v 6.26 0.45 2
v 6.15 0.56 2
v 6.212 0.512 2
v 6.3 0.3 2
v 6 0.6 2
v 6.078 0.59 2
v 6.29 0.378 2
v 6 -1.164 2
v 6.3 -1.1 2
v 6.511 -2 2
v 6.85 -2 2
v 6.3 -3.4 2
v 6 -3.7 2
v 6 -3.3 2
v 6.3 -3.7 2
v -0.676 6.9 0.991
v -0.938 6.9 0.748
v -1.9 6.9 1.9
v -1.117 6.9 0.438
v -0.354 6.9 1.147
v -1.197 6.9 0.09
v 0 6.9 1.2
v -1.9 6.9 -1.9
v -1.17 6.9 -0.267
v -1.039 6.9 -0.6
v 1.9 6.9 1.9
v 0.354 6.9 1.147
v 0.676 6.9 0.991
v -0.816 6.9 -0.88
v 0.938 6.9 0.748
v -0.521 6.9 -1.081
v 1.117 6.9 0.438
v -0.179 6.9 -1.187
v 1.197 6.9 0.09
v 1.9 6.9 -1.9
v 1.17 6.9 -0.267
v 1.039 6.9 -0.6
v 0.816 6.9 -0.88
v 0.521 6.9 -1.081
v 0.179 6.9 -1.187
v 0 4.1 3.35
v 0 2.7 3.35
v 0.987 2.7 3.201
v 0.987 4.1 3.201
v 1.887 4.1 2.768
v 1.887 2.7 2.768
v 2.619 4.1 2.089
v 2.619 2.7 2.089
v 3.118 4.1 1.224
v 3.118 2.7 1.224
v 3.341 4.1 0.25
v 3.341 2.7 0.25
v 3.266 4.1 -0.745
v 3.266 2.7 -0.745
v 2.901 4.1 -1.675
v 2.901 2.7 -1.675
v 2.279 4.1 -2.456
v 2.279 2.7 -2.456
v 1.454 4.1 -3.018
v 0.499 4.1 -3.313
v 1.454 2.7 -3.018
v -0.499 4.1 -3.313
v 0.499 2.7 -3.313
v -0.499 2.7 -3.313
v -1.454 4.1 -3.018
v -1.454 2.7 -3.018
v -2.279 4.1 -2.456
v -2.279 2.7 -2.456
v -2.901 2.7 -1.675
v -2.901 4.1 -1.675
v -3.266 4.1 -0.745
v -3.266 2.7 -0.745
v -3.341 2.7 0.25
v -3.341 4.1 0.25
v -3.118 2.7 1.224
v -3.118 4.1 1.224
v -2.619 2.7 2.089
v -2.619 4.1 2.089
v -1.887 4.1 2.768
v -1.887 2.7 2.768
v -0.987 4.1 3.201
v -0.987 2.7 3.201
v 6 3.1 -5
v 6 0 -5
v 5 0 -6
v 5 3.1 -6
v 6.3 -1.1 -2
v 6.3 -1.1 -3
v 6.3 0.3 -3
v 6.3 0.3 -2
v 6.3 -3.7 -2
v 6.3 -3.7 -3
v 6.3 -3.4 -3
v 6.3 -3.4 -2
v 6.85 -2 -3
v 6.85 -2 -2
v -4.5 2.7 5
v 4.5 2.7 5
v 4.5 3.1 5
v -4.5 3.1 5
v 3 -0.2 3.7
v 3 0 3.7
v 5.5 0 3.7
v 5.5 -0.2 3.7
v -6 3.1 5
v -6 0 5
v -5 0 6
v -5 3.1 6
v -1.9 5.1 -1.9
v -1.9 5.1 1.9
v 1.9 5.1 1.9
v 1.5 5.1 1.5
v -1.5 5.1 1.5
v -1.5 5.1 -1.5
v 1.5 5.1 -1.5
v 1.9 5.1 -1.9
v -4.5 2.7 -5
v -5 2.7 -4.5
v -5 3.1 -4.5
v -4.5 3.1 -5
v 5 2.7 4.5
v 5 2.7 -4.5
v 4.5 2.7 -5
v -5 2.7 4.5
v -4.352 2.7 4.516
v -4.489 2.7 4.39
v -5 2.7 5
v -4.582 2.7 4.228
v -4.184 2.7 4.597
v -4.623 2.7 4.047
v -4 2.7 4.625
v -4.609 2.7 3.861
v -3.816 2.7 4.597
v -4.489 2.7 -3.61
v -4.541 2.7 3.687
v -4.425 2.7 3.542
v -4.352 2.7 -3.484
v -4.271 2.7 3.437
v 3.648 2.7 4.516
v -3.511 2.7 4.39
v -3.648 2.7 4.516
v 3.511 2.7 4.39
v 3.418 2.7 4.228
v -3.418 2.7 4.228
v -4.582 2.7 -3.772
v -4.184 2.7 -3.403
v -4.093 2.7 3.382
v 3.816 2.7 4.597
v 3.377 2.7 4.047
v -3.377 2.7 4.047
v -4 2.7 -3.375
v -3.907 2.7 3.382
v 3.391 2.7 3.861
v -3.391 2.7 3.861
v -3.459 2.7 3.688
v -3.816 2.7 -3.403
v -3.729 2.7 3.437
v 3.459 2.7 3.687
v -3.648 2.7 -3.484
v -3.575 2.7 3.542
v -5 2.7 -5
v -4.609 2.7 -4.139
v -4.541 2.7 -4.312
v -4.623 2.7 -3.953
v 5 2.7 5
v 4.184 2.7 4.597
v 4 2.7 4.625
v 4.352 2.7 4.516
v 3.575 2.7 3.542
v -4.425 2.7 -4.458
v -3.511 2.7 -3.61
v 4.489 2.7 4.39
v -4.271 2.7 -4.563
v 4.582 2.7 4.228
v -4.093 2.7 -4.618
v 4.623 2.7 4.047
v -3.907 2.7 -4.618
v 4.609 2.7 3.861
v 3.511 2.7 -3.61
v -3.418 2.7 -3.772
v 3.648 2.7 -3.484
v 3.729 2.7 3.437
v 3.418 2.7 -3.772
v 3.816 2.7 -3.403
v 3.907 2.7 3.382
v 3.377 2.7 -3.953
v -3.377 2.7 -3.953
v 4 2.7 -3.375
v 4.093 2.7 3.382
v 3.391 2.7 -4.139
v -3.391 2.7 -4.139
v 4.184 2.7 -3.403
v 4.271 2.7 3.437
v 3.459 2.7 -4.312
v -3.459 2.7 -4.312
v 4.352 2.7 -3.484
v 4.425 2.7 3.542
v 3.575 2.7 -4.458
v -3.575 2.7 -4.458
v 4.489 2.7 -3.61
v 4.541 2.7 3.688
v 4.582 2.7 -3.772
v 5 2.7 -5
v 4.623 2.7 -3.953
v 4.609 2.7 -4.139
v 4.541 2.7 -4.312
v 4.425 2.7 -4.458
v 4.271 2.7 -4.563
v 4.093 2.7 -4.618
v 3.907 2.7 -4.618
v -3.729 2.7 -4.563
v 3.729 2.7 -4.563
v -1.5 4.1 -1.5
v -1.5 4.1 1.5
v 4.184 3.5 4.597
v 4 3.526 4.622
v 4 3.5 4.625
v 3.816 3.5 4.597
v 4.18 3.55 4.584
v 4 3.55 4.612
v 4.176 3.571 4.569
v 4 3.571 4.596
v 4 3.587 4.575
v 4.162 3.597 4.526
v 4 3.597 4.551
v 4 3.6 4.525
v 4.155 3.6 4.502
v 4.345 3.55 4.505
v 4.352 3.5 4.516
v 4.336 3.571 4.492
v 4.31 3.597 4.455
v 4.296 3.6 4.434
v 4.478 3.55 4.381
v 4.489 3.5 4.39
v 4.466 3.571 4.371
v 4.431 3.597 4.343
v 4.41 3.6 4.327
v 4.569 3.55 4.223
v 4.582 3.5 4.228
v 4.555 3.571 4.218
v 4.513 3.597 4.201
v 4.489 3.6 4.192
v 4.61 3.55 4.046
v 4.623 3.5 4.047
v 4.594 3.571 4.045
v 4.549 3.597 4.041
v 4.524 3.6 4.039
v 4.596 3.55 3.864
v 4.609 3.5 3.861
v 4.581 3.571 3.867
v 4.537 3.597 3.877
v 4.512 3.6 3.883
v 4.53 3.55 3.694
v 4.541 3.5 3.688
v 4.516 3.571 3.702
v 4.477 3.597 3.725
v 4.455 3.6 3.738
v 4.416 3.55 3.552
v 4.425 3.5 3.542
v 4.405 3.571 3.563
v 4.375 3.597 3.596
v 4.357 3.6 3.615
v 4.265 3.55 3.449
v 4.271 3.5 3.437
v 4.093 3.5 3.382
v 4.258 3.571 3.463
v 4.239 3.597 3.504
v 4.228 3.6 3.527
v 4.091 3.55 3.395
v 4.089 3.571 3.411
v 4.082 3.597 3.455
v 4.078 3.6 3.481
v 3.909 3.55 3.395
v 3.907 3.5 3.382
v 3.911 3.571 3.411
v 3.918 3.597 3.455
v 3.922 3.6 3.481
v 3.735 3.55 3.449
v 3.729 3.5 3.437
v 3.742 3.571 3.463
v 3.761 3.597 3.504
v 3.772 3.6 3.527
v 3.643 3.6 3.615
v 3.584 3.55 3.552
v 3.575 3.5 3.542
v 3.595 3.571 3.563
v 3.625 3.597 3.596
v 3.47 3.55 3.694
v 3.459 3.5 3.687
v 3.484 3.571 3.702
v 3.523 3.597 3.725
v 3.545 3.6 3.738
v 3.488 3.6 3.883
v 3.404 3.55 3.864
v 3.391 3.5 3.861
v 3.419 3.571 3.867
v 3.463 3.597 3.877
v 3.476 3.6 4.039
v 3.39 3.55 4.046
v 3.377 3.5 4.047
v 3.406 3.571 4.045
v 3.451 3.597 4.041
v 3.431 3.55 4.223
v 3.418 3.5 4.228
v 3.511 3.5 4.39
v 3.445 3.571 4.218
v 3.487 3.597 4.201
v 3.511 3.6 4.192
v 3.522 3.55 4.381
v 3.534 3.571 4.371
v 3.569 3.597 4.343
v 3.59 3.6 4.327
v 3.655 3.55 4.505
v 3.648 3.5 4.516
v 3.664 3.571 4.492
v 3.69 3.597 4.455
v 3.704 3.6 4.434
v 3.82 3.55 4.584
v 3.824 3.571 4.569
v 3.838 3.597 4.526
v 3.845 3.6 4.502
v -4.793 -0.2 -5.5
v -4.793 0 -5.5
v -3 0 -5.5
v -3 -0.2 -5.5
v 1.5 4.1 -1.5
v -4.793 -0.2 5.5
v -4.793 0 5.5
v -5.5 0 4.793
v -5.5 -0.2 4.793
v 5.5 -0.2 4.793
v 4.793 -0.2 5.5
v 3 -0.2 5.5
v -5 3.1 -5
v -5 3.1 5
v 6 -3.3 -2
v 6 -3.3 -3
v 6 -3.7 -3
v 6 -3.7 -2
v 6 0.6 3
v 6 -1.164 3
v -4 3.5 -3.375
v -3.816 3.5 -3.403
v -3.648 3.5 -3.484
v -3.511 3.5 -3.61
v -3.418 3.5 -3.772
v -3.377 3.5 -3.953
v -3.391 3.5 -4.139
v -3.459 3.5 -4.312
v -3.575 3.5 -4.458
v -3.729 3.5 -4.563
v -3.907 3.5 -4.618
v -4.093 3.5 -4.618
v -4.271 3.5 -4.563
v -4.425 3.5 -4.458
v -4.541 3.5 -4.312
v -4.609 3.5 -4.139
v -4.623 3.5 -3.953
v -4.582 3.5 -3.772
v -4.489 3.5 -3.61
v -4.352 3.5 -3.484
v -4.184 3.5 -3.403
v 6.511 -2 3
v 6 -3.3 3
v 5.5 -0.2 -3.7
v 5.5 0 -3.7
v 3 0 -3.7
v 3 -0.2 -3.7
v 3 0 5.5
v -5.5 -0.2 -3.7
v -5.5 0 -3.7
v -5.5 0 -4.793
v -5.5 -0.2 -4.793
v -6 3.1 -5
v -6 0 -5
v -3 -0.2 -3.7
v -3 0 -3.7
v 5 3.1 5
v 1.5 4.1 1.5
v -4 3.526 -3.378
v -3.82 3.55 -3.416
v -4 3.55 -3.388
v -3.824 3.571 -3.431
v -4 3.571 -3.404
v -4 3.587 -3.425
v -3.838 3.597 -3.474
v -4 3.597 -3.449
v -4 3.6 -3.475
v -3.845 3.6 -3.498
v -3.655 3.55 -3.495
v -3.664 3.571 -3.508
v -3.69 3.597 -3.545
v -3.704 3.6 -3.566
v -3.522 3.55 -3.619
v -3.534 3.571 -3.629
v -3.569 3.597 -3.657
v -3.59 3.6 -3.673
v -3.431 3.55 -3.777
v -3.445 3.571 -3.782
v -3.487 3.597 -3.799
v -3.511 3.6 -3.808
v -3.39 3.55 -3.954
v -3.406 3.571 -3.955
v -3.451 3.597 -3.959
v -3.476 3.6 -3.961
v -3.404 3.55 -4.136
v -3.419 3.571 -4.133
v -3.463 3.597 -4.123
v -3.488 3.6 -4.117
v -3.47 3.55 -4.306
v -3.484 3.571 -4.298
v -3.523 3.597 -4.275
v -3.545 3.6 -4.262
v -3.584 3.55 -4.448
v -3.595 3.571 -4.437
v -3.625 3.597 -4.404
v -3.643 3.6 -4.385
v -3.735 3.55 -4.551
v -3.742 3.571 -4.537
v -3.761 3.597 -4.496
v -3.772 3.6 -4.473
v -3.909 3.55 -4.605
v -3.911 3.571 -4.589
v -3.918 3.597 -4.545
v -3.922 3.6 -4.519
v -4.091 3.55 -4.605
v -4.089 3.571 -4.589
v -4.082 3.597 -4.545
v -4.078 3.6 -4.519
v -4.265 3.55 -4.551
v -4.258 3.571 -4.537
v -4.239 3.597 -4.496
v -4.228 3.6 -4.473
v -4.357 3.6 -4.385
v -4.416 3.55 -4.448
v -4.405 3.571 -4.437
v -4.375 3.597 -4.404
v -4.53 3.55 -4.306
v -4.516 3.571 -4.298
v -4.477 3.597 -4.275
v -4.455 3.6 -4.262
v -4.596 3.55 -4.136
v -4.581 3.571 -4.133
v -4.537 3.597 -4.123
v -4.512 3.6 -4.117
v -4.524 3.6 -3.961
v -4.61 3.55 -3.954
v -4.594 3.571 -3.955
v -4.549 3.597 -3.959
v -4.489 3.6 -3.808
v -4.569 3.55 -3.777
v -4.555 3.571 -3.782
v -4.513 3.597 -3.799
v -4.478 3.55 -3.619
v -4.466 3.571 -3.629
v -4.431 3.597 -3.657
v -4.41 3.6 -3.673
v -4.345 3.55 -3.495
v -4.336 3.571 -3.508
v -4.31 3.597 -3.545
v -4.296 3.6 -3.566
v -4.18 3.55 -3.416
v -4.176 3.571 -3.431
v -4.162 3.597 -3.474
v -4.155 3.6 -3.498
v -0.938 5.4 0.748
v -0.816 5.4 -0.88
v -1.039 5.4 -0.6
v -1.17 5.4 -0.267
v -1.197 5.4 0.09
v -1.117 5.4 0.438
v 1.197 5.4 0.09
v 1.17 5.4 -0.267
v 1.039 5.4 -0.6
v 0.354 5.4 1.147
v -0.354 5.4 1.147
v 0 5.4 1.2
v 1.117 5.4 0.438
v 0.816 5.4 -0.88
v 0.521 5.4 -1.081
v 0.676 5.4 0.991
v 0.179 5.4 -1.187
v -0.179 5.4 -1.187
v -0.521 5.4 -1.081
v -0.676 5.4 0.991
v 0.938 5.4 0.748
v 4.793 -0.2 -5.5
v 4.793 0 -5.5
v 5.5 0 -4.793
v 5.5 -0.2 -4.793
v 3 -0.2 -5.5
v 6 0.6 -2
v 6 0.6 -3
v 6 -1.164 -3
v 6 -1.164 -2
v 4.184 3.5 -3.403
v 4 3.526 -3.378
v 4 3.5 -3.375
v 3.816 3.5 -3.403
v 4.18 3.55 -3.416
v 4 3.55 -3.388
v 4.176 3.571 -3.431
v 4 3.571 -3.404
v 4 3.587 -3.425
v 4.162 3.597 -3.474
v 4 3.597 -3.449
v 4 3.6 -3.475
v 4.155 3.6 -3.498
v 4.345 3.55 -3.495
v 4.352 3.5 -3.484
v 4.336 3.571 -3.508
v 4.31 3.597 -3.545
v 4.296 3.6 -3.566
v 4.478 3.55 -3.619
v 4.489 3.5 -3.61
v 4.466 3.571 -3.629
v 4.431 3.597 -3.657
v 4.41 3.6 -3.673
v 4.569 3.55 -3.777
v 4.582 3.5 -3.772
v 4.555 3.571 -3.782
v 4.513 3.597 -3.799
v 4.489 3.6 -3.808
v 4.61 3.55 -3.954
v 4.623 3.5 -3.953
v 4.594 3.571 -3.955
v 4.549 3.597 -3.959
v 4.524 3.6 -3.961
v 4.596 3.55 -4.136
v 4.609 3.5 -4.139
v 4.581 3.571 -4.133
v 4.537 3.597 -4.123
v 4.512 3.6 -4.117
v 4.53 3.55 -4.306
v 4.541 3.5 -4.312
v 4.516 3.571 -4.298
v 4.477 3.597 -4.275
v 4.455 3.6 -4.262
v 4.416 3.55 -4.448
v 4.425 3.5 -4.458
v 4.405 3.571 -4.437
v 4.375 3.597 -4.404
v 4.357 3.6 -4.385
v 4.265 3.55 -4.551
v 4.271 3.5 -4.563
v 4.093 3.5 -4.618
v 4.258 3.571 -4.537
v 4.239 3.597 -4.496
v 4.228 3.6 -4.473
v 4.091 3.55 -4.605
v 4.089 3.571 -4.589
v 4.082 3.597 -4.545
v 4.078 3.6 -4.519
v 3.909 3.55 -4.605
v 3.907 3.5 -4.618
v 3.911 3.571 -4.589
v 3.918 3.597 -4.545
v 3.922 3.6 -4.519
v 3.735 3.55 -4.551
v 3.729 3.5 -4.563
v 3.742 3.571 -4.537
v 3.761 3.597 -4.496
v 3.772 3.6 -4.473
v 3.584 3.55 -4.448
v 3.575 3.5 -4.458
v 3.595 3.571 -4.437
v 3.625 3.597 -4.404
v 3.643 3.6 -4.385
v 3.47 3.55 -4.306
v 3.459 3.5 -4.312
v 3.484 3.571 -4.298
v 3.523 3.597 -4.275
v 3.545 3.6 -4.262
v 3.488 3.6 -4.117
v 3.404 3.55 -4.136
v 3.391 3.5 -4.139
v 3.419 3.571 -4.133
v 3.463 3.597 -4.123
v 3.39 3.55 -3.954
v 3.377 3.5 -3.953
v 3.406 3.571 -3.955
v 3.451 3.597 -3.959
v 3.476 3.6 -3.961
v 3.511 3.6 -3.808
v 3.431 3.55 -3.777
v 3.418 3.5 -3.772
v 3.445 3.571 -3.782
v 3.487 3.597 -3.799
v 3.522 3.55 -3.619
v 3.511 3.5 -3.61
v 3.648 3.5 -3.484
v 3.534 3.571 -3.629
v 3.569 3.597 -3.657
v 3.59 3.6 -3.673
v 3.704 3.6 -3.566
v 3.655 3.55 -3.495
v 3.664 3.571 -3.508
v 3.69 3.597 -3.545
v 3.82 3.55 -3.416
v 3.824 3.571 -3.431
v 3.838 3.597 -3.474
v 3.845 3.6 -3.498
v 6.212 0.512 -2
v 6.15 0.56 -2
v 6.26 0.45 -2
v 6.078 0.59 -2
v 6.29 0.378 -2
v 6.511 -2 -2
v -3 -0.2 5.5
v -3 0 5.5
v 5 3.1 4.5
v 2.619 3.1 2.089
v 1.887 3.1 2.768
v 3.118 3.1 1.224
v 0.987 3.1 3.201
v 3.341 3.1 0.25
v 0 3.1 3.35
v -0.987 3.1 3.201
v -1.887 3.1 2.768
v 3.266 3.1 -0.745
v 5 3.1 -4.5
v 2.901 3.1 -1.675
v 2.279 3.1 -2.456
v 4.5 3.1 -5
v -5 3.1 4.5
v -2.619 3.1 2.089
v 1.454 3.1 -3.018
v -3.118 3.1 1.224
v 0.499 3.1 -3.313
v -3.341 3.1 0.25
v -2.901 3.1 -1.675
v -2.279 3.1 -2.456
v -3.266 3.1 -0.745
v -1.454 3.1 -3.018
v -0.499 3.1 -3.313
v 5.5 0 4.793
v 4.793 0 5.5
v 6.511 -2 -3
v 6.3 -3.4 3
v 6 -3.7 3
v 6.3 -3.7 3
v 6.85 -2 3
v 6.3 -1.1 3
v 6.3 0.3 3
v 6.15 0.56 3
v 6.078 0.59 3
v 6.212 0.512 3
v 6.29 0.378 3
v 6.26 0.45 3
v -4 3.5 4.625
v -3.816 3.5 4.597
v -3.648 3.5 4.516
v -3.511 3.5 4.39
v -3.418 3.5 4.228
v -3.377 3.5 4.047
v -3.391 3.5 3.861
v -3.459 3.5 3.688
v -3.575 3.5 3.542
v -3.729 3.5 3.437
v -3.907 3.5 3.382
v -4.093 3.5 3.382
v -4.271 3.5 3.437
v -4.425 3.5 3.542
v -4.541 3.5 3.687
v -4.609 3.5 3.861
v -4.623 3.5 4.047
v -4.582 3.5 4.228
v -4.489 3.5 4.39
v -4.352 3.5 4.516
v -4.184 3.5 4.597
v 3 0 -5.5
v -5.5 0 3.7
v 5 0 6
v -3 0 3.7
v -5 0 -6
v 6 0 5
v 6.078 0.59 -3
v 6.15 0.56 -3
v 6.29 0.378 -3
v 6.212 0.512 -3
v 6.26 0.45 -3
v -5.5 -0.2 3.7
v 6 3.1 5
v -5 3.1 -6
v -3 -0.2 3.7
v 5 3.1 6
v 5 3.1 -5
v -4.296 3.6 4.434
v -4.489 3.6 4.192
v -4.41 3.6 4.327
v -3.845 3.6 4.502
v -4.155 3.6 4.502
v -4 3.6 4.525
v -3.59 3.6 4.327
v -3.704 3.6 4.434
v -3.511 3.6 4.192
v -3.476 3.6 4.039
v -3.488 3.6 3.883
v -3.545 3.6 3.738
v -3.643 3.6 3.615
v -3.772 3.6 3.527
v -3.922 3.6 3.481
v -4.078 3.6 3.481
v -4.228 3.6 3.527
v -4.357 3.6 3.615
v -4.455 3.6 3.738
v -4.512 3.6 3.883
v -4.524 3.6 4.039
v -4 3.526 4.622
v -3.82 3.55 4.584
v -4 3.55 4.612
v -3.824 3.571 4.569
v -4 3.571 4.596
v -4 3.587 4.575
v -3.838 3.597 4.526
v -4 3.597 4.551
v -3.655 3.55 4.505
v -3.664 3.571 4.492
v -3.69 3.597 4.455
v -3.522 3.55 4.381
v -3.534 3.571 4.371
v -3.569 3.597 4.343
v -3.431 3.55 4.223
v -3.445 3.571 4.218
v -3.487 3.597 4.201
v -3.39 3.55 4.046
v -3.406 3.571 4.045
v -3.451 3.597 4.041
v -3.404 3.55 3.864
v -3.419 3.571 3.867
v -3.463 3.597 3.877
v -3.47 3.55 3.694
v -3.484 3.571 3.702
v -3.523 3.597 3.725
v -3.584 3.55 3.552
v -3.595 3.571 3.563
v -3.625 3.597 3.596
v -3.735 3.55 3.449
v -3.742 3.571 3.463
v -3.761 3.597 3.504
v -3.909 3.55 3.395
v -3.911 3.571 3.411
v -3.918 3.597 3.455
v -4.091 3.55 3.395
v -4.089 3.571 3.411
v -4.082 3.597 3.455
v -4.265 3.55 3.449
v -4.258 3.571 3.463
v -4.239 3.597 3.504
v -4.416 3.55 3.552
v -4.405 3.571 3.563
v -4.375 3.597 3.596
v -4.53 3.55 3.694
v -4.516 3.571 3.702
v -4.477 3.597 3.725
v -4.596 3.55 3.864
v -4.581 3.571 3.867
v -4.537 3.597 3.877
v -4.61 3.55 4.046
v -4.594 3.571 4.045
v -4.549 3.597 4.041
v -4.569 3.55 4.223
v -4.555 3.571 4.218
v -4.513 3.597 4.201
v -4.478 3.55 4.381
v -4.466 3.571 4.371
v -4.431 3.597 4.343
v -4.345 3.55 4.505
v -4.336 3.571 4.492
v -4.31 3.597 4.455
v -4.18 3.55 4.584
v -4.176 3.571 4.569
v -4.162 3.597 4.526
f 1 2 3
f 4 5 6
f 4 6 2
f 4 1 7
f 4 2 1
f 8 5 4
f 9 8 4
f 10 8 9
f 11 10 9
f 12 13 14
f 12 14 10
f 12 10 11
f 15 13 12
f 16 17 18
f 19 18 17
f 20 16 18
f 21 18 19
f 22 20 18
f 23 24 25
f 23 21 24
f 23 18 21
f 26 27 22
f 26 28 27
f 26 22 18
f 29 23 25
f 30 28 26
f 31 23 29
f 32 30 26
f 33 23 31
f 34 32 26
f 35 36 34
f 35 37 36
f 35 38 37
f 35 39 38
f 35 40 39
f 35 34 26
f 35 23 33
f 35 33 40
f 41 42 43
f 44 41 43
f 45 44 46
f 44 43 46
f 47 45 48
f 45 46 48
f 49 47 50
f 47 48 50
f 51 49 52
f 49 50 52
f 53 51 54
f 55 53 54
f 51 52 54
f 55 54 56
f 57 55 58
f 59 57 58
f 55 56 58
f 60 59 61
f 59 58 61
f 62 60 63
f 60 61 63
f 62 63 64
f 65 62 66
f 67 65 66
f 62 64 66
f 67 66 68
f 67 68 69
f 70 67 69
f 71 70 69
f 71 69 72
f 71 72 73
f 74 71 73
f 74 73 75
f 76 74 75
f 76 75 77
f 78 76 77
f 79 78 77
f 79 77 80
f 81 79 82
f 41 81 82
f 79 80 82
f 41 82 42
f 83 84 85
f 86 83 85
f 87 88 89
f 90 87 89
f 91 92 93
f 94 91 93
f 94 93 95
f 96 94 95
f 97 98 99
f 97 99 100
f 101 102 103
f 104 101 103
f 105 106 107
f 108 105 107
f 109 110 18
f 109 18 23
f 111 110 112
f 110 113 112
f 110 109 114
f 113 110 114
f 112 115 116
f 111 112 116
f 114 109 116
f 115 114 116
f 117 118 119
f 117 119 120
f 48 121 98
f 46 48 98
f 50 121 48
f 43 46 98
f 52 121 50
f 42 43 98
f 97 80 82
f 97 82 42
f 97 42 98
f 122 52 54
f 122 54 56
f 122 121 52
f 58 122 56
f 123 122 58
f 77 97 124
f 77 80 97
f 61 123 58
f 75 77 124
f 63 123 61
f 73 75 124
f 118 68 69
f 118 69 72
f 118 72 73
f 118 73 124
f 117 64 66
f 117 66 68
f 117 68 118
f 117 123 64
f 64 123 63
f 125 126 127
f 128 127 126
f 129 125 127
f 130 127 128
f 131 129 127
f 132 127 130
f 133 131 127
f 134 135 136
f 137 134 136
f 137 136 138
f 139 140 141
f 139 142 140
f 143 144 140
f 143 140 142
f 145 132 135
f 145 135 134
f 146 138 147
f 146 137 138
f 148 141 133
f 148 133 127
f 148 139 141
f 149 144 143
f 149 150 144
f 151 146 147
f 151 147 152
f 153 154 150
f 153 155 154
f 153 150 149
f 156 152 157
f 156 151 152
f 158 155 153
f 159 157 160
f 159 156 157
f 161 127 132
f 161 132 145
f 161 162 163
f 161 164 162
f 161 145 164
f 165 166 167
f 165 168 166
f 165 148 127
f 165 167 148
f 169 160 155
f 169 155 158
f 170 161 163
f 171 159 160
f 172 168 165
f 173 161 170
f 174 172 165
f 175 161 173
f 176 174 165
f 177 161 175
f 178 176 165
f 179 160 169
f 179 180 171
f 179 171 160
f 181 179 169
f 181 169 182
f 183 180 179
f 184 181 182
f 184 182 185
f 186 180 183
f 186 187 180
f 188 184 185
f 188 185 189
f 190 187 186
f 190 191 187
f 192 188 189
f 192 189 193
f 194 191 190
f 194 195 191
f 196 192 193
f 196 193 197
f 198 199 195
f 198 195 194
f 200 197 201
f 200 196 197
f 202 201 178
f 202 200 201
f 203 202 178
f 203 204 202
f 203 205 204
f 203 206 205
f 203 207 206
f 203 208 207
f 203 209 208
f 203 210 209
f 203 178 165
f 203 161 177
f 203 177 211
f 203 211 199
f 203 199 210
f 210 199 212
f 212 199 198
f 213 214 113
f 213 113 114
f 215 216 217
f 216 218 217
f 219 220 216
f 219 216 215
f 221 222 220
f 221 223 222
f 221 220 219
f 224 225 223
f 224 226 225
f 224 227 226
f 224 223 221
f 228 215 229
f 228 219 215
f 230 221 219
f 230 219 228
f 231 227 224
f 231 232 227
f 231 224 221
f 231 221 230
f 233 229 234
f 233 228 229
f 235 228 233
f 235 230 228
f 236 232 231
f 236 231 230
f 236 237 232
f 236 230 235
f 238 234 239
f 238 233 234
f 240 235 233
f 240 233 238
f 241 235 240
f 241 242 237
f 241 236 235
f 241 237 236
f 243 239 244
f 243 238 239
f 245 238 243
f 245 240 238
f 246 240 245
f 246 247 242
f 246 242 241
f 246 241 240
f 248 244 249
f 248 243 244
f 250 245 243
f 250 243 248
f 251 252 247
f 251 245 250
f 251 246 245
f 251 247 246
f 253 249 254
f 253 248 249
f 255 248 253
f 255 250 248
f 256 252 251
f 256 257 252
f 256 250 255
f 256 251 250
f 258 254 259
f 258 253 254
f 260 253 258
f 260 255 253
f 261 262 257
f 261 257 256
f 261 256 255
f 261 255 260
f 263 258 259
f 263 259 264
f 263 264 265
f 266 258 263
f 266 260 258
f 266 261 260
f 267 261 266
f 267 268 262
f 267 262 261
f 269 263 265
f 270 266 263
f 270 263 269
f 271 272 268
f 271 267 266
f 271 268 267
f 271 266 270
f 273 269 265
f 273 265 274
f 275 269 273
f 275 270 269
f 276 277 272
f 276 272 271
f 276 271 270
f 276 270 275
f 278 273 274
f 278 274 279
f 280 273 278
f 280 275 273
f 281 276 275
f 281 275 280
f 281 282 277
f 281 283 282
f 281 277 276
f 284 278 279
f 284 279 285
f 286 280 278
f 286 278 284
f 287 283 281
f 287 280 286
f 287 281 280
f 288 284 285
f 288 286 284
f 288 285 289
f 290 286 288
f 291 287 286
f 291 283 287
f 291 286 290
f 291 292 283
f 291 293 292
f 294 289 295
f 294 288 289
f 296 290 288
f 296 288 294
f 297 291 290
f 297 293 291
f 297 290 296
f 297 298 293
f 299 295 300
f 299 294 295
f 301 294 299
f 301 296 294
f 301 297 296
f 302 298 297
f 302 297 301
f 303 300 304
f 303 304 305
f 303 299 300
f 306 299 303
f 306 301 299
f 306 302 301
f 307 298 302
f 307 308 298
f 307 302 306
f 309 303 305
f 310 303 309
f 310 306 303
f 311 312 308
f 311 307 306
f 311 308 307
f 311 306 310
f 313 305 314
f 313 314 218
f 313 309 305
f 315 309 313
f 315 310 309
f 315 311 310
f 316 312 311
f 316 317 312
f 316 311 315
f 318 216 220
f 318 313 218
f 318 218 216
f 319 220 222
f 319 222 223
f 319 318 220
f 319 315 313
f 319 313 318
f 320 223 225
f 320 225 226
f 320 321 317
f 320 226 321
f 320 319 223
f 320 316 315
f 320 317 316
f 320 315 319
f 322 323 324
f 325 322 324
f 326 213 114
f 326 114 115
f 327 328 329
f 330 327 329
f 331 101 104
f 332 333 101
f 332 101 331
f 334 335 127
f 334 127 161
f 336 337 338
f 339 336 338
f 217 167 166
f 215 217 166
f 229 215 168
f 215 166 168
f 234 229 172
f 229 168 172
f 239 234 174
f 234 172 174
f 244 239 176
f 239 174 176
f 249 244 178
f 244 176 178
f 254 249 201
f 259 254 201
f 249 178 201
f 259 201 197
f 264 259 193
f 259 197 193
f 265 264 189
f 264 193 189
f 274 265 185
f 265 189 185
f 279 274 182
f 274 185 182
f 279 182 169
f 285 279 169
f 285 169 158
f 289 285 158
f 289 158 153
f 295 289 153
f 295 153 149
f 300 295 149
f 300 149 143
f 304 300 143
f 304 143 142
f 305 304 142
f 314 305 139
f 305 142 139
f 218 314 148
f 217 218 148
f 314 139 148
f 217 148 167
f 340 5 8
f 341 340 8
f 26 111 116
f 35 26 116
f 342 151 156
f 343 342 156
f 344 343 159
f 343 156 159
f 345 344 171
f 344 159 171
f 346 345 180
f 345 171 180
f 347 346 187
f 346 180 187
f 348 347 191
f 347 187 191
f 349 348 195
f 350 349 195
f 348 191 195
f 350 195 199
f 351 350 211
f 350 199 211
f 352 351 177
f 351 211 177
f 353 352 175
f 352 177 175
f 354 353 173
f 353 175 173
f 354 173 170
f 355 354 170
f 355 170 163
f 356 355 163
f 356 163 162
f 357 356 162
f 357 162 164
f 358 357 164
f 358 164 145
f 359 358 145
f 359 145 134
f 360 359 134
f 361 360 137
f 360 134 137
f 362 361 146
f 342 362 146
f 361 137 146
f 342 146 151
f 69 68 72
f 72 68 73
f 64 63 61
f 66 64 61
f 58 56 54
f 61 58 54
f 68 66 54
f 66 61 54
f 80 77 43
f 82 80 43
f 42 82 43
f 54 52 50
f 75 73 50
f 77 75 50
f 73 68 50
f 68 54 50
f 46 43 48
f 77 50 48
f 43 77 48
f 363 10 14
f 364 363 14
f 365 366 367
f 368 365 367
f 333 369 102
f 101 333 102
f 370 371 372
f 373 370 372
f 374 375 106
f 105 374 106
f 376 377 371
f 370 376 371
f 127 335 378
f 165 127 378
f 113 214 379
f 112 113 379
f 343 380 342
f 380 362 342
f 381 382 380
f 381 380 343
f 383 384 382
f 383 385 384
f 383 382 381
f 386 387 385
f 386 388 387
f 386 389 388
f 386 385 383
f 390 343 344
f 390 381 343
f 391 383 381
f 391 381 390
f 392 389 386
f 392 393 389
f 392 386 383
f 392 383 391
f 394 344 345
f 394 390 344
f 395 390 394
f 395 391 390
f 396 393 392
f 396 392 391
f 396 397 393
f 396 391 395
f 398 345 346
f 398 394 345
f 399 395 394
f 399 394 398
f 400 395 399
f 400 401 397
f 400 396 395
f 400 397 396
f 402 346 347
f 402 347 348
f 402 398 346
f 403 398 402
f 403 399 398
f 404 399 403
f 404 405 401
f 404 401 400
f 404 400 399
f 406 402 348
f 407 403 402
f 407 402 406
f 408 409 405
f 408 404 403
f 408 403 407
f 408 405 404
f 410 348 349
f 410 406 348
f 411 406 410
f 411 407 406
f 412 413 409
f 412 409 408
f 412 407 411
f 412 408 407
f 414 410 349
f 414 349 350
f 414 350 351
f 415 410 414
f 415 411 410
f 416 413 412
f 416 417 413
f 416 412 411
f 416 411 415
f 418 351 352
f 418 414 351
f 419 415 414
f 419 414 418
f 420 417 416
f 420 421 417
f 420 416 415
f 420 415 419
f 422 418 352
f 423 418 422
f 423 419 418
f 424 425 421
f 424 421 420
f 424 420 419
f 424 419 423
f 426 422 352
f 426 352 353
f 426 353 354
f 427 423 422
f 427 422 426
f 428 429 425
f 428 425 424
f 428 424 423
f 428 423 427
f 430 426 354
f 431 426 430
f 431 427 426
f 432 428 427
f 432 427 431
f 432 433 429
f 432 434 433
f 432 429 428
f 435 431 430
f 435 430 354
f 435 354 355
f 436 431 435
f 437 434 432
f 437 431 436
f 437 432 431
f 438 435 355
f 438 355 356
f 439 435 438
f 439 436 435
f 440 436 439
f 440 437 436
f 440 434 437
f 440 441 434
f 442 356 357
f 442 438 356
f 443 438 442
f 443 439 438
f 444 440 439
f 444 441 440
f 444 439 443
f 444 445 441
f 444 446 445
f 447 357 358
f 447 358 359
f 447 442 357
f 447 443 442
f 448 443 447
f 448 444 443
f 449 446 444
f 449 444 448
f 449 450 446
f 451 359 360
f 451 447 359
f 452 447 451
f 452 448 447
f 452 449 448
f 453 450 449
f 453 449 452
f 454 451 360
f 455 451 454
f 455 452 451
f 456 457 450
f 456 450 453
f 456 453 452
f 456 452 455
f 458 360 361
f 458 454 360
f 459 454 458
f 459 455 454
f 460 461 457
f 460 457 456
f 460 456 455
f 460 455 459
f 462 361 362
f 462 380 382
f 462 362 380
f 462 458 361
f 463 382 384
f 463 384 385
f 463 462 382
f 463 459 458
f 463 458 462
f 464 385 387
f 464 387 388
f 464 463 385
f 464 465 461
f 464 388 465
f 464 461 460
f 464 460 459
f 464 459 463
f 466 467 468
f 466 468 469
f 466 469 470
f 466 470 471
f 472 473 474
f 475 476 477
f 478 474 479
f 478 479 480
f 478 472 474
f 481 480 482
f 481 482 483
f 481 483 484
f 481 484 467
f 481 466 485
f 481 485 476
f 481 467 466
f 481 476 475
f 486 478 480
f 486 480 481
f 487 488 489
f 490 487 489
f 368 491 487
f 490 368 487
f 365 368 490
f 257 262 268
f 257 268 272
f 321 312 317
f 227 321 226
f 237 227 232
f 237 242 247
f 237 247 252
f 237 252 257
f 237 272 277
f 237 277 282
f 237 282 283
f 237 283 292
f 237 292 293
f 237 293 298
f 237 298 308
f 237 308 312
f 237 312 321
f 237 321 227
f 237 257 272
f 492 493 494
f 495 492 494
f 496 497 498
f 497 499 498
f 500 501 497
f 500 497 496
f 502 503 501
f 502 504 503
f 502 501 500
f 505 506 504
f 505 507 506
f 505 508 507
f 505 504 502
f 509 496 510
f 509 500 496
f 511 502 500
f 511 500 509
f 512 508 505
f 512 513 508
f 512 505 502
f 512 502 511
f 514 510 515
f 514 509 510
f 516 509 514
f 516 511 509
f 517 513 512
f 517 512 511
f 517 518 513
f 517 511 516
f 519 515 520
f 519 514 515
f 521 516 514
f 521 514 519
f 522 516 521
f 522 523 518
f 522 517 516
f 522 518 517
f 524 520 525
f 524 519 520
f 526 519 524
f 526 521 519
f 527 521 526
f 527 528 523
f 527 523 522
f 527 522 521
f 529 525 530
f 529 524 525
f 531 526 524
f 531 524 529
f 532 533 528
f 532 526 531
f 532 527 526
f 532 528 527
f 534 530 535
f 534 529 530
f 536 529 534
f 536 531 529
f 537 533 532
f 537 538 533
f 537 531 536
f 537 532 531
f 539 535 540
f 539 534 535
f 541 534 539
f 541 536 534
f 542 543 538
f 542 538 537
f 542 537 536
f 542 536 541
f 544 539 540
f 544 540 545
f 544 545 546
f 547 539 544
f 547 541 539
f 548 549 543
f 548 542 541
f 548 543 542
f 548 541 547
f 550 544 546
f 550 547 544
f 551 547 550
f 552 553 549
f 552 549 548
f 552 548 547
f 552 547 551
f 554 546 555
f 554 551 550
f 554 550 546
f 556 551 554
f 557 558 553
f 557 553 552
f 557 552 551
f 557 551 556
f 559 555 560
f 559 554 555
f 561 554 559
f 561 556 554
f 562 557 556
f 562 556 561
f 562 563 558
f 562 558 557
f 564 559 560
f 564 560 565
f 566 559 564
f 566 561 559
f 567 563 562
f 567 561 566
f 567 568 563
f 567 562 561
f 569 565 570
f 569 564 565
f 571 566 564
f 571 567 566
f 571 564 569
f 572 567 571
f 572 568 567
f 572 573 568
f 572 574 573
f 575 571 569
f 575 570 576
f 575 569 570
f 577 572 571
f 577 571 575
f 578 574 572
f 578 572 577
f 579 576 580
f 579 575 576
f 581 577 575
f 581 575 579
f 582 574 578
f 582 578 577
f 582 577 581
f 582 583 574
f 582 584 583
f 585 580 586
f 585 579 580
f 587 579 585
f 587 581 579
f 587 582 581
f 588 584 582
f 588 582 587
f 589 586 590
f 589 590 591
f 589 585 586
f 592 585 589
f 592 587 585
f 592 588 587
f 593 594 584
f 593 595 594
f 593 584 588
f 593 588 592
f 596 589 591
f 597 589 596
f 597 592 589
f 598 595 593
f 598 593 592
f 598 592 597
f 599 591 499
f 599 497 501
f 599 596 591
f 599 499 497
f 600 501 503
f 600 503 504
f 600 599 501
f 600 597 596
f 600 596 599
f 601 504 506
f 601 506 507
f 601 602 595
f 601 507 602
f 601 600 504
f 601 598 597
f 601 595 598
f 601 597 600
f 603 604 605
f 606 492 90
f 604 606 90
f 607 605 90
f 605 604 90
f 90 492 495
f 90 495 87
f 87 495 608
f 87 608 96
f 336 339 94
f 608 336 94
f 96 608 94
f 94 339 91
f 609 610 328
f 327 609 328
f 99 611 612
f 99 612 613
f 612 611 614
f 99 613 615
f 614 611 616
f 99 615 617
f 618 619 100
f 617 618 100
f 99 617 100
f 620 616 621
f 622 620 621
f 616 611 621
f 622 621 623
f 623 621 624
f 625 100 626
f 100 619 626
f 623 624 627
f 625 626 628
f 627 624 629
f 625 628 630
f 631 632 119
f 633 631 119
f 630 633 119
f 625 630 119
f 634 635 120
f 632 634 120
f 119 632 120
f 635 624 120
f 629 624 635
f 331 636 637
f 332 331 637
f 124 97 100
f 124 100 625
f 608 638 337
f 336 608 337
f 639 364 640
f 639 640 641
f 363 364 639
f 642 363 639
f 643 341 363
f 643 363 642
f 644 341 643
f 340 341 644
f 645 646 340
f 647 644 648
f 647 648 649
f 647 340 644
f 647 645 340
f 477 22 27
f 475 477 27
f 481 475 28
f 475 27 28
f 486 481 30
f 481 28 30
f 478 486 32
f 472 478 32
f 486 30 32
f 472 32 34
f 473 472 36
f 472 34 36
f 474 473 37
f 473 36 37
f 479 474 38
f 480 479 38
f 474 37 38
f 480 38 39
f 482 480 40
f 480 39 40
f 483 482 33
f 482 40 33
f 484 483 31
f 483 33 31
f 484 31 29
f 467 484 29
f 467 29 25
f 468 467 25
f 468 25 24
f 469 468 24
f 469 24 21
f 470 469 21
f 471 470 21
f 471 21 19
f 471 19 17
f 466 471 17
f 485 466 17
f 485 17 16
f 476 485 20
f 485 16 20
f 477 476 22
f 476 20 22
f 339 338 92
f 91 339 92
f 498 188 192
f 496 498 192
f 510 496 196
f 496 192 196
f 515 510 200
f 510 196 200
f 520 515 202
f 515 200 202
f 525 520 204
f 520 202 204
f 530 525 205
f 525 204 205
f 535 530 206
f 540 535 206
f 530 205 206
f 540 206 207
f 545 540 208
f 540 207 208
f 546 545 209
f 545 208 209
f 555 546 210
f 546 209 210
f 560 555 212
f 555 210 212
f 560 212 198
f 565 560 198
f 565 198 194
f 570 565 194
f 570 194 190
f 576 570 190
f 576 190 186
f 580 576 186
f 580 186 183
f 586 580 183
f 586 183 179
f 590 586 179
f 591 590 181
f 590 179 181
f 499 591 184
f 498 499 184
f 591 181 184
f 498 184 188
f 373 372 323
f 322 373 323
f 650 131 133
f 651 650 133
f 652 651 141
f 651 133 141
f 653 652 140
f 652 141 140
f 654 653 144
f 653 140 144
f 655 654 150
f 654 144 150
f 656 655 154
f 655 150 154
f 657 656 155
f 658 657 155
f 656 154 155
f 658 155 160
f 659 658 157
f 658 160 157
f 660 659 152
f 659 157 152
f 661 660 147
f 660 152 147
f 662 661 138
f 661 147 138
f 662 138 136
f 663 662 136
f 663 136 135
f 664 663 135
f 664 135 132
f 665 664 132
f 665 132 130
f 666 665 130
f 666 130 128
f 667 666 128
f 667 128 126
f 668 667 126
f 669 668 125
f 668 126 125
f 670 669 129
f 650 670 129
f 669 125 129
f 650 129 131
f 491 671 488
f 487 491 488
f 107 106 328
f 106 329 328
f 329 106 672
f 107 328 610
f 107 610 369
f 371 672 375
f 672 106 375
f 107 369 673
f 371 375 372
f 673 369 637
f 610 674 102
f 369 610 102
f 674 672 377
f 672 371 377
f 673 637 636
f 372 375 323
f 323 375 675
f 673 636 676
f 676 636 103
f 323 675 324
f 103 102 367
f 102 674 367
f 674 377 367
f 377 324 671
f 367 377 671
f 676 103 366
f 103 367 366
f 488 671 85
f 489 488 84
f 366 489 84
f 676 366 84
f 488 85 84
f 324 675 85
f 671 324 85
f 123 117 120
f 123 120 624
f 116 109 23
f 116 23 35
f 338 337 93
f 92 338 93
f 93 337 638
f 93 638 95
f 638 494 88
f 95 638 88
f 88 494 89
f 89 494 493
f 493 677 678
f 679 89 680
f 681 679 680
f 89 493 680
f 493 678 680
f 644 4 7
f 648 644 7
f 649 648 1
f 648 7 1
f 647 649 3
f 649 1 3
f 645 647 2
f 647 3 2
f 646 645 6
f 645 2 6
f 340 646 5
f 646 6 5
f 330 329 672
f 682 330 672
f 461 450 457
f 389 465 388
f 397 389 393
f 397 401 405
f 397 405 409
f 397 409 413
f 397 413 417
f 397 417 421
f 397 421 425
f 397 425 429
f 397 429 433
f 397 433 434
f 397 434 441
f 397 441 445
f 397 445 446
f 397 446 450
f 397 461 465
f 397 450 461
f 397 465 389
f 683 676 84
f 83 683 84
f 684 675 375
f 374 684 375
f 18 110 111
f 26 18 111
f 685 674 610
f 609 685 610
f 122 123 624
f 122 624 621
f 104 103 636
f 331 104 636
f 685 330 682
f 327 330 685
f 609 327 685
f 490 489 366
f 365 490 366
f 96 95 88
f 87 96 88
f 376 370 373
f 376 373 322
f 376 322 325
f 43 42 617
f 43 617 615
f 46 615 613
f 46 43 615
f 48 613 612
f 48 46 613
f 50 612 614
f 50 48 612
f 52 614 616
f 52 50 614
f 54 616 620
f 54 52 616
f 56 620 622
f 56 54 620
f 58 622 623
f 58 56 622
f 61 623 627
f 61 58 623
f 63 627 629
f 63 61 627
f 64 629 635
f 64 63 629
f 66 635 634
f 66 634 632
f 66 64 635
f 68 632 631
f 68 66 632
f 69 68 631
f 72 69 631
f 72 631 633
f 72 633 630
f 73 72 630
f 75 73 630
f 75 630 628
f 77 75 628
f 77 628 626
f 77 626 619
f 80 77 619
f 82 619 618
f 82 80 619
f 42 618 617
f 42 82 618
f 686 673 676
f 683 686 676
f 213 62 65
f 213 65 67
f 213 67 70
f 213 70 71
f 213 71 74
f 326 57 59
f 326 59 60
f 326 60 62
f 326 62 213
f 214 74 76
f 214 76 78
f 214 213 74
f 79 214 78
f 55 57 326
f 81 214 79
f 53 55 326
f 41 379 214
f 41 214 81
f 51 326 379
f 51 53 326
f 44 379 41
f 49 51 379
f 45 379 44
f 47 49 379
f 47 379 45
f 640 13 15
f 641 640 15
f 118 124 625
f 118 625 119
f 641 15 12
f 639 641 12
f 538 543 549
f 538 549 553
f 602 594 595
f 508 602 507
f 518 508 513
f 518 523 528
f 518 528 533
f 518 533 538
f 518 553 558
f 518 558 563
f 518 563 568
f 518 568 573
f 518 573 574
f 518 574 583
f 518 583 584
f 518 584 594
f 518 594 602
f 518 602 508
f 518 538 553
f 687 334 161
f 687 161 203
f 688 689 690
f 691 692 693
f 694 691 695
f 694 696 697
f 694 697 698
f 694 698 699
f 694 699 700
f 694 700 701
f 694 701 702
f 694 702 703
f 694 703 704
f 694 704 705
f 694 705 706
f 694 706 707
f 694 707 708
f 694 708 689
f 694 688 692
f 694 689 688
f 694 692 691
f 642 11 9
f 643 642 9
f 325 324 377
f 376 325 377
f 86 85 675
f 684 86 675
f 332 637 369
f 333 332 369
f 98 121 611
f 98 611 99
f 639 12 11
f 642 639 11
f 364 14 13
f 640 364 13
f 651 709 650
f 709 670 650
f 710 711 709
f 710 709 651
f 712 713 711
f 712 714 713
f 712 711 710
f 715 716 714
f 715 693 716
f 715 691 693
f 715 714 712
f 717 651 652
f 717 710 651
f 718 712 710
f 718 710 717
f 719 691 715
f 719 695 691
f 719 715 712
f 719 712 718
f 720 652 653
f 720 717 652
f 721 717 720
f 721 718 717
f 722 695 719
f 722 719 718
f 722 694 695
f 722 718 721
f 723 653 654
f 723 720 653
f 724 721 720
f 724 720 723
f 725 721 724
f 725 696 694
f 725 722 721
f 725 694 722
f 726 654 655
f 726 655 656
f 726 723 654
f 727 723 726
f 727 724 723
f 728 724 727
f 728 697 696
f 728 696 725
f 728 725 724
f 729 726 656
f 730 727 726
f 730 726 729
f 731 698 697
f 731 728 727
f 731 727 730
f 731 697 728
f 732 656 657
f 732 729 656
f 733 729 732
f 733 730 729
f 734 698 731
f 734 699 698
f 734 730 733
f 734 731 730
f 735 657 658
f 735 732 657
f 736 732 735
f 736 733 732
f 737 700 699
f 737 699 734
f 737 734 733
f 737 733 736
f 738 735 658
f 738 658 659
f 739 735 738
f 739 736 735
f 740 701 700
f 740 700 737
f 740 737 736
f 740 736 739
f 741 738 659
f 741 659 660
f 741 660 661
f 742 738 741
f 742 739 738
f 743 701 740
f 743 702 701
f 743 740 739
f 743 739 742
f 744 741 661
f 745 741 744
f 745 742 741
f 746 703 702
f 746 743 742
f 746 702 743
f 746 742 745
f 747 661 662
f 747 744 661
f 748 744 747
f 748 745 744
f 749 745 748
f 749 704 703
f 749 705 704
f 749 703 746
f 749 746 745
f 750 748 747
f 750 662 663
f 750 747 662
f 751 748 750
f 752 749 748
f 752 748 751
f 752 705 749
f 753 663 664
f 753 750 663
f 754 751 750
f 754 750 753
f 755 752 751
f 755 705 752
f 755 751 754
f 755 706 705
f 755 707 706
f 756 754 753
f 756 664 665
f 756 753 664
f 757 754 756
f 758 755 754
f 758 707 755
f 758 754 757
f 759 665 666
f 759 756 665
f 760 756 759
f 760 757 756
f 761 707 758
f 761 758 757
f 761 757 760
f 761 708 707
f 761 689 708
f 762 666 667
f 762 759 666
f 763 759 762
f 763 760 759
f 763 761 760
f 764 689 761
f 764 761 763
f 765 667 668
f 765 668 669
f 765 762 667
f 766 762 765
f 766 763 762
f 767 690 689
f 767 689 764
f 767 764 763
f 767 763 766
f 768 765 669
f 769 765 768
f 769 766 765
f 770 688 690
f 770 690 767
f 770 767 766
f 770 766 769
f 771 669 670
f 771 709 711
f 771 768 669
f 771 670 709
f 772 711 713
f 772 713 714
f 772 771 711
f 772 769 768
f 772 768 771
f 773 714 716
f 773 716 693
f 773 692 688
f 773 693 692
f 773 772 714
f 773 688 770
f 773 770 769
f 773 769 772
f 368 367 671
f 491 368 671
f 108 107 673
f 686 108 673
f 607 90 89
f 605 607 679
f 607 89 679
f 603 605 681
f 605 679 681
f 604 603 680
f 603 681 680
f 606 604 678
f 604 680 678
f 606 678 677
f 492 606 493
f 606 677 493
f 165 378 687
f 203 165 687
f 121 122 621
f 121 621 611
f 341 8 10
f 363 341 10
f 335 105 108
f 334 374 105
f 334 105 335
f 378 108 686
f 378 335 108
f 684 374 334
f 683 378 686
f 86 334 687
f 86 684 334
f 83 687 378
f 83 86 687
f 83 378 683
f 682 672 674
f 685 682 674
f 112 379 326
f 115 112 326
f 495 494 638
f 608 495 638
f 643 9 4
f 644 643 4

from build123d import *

# Parameters (mm, degrees)
BOSS_EXTRUDE1_DEPTH      = 3.1
SKETCH2_W                = 10
SKETCH2_H                = 10
CUT_EXTRUDE1_DEPTH       = 0.4
SKETCH3_R                = 0.625
BOSS_EXTRUDE2_DEPTH      = 0.9
FILLET1_R                = 0.1
SKETCH4_R                = 3.35
BOSS_EXTRUDE3_DEPTH      = 0.4
BOSS_EXTRUDE4_DEPTH      = 3
BOSS_EXTRUDE4_DEPTH_BACK = 3
CUT_EXTRUDE2_DEPTH       = 10.829165784
CUT_EXTRUDE2_DEPTH_BACK  = 10.829165784
SKETCH6_W                = 0.85
SKETCH6_H                = 4
SKETCH7_R                = 3.35
BOSS_EXTRUDE5_DEPTH      = 1.4
SKETCH8_W                = 3
SKETCH8_H                = 3
BOSS_EXTRUDE6_DEPTH      = 1
SKETCH9_W                = 3.8
SKETCH9_H                = 3.8
BOSS_EXTRUDE7_DEPTH      = 1.8
SKETCH11_R               = 1.2
CUT_EXTRUDE3_DEPTH       = 1.5
BOSS_EXTRUDE8_DEPTH      = 0.2


with BuildPart() as part:
    # Sketch1 → Boss-Extrude1 (new body)
    with BuildSketch(Plane(origin=(0, 0, 0), x_dir=(1, 0, 0), z_dir=(0, 1, 0))):
        Polygon((-5, 6), (-6, 5), (-6, -5), (-5, -6), (5, -6), (6, -5), (6, 5), (5, 6), align=None)
    extrude(amount=BOSS_EXTRUDE1_DEPTH)

    # Sketch2 → Cut-Extrude1 (cut)
    with BuildSketch(Plane(origin=(0, 3.1, 0), x_dir=(1, 0, 0), z_dir=(0, 1, 0))):
        Rectangle(SKETCH2_W, SKETCH2_H)
    extrude(amount=-CUT_EXTRUDE1_DEPTH, mode=Mode.SUBTRACT)

    # Sketch3 → Boss-Extrude2 (add)
    with BuildSketch(Plane(origin=(0, 2.7, 0), x_dir=(1, 0, 0), z_dir=(0, 1, 0))):
        with Locations(Location((-4, 4, 0), (0, 0, 270))):
            Circle(SKETCH3_R)
        with Locations(Location((4, 4, 0), (0, 0, 270))):
            Circle(SKETCH3_R)
        with Locations(Location((-4, -4, 0), (0, 0, 270))):
            Circle(SKETCH3_R)
        with Locations(Location((4, -4, 0), (0, 0, 270))):
            Circle(SKETCH3_R)
    extrude(amount=BOSS_EXTRUDE2_DEPTH)

    # Fillet1
    fillet1_edges = [part.edges().sort_by_distance(p)[0] for p in [
        (-4, 3.6, -4.625),
        (4, 3.6, -4.625),
        (-4, 3.6, 3.375),
        (4, 3.6, 3.375),
    ]]
    fillet(fillet1_edges, radius=FILLET1_R)

    # Sketch12 → Boss-Extrude8 (add)
    with BuildSketch(Plane.XZ):
        Polygon((3, 5.5), (3, 3.7), (5.5, 3.7), (5.5, 4.792893219), (4.792893219, 5.5), align=None)
        Polygon((4.792893219, -5.5), (5.5, -4.792893219), (5.5, -3.7), (3, -3.7), (3, -5.5), align=None)
        Polygon((-3, -5.5), (-3, -3.7), (-5.5, -3.7), (-5.5, -4.792893219), (-4.792893219, -5.5), align=None)
        Polygon((-4.792893219, 5.5), (-5.5, 4.792893219), (-5.5, 3.7), (-3, 3.7), (-3, 5.5), align=None)
    extrude(amount=BOSS_EXTRUDE8_DEPTH)


with BuildPart() as body_2:
    # Sketch4 → Boss-Extrude3 (new body)
    with BuildSketch(Plane(origin=(0, 2.7, 0), x_dir=(1, 0, 0), z_dir=(0, 1, 0))):
        Polygon((4.5, -5), (-4.5, -5), (-5, -4.5), (-5, 4.5), (-4.5, 5), (4.5, 5), (5, 4.5), (5, -4.5), align=None)
        with Locations(Location((0, 0, 0), (0, 0, 270))):
            Circle(SKETCH4_R, mode=Mode.SUBTRACT)
    extrude(amount=BOSS_EXTRUDE3_DEPTH)


with BuildPart() as body_3:
    # Sketch5 → Boss-Extrude4 (new, two sides: drawn at the far end of the back side and taken through both)
    with BuildSketch(Plane.XY.offset(-BOSS_EXTRUDE4_DEPTH_BACK)):
        with BuildLine():
            Line((6, 0.6), (6, -1.164285714))
            Line((6, -1.164285714), (6.510714286, -2))
            Line((6.510714286, -2), (6, -3.3))
            Line((6, -3.3), (6, -3.7))
            Line((6, -3.7), (6.3, -3.7))
            Line((6.3, -3.7), (6.3, -3.4))
            Line((6.3, -3.4), (6.85, -2))
            Line((6.85, -2), (6.3, -1.1))
            Line((6.3, -1.1), (6.3, 0.3))
            ThreePointArc((6.3, 0.3), (6.212132034, 0.512132034), (6, 0.6))
        make_face()
    extrude(amount=BOSS_EXTRUDE4_DEPTH + BOSS_EXTRUDE4_DEPTH_BACK)

    # Sketch6 → Cut-Extrude2 (cut, two sides: drawn at the far end of the back side and taken through both)
    with BuildSketch(Plane(origin=(0, 0, 0), x_dir=(1, 0, 0), z_dir=(0, 1, 0)).offset(-CUT_EXTRUDE2_DEPTH_BACK)):
        with Locations((6.425, 0)):
            Rectangle(SKETCH6_W, SKETCH6_H)
    extrude(amount=CUT_EXTRUDE2_DEPTH + CUT_EXTRUDE2_DEPTH_BACK, mode=Mode.SUBTRACT)


with BuildPart() as cut_extrude2_piece_1:
    # of the separate pieces the step leaves, piece 1, a body of its own (cut_extrude2_pieces)
    add(body_3.part.solids().sort_by_distance((6, 0.6, -2))[0])


with BuildPart() as cut_extrude2_piece_2:
    # of the separate pieces the step leaves, piece 2, a body of its own (cut_extrude2_pieces)
    add(body_3.part.solids().sort_by_distance((6, 0.6, 3))[0])


with BuildPart() as body_5:
    # Sketch7 → Boss-Extrude5 (new body)
    with BuildSketch(Plane(origin=(0, 2.7, 0), x_dir=(1, 0, 0), z_dir=(0, 1, 0))):
        with Locations(Location((0, 0, 0), (0, 0, 270))):
            Circle(SKETCH7_R)
    extrude(amount=BOSS_EXTRUDE5_DEPTH)

    # Sketch8 → Boss-Extrude6 (add)
    with BuildSketch(Plane(origin=(0, 4.1, 0), x_dir=(1, 0, 0), z_dir=(0, 1, 0))):
        Rectangle(SKETCH8_W, SKETCH8_H)
    extrude(amount=BOSS_EXTRUDE6_DEPTH)

    # Sketch9 → Boss-Extrude7 (add)
    with BuildSketch(Plane(origin=(0, 5.1, 0), x_dir=(1, 0, 0), z_dir=(0, 1, 0))):
        Rectangle(SKETCH9_W, SKETCH9_H)
    extrude(amount=BOSS_EXTRUDE7_DEPTH)

    # Sketch11 → Cut-Extrude3 (cut)
    with BuildSketch(Plane(origin=(0, 6.9, 0), x_dir=(1, 0, 0), z_dir=(0, 1, 0))):
        with Locations(Location((0, 0, 0), (0, 0, 270))):
            Circle(SKETCH11_R)
    extrude(amount=-CUT_EXTRUDE3_DEPTH, mode=Mode.SUBTRACT)


solid = Compound([part.part, body_2.part, cut_extrude2_piece_1.part, cut_extrude2_piece_2.part, body_5.part])
